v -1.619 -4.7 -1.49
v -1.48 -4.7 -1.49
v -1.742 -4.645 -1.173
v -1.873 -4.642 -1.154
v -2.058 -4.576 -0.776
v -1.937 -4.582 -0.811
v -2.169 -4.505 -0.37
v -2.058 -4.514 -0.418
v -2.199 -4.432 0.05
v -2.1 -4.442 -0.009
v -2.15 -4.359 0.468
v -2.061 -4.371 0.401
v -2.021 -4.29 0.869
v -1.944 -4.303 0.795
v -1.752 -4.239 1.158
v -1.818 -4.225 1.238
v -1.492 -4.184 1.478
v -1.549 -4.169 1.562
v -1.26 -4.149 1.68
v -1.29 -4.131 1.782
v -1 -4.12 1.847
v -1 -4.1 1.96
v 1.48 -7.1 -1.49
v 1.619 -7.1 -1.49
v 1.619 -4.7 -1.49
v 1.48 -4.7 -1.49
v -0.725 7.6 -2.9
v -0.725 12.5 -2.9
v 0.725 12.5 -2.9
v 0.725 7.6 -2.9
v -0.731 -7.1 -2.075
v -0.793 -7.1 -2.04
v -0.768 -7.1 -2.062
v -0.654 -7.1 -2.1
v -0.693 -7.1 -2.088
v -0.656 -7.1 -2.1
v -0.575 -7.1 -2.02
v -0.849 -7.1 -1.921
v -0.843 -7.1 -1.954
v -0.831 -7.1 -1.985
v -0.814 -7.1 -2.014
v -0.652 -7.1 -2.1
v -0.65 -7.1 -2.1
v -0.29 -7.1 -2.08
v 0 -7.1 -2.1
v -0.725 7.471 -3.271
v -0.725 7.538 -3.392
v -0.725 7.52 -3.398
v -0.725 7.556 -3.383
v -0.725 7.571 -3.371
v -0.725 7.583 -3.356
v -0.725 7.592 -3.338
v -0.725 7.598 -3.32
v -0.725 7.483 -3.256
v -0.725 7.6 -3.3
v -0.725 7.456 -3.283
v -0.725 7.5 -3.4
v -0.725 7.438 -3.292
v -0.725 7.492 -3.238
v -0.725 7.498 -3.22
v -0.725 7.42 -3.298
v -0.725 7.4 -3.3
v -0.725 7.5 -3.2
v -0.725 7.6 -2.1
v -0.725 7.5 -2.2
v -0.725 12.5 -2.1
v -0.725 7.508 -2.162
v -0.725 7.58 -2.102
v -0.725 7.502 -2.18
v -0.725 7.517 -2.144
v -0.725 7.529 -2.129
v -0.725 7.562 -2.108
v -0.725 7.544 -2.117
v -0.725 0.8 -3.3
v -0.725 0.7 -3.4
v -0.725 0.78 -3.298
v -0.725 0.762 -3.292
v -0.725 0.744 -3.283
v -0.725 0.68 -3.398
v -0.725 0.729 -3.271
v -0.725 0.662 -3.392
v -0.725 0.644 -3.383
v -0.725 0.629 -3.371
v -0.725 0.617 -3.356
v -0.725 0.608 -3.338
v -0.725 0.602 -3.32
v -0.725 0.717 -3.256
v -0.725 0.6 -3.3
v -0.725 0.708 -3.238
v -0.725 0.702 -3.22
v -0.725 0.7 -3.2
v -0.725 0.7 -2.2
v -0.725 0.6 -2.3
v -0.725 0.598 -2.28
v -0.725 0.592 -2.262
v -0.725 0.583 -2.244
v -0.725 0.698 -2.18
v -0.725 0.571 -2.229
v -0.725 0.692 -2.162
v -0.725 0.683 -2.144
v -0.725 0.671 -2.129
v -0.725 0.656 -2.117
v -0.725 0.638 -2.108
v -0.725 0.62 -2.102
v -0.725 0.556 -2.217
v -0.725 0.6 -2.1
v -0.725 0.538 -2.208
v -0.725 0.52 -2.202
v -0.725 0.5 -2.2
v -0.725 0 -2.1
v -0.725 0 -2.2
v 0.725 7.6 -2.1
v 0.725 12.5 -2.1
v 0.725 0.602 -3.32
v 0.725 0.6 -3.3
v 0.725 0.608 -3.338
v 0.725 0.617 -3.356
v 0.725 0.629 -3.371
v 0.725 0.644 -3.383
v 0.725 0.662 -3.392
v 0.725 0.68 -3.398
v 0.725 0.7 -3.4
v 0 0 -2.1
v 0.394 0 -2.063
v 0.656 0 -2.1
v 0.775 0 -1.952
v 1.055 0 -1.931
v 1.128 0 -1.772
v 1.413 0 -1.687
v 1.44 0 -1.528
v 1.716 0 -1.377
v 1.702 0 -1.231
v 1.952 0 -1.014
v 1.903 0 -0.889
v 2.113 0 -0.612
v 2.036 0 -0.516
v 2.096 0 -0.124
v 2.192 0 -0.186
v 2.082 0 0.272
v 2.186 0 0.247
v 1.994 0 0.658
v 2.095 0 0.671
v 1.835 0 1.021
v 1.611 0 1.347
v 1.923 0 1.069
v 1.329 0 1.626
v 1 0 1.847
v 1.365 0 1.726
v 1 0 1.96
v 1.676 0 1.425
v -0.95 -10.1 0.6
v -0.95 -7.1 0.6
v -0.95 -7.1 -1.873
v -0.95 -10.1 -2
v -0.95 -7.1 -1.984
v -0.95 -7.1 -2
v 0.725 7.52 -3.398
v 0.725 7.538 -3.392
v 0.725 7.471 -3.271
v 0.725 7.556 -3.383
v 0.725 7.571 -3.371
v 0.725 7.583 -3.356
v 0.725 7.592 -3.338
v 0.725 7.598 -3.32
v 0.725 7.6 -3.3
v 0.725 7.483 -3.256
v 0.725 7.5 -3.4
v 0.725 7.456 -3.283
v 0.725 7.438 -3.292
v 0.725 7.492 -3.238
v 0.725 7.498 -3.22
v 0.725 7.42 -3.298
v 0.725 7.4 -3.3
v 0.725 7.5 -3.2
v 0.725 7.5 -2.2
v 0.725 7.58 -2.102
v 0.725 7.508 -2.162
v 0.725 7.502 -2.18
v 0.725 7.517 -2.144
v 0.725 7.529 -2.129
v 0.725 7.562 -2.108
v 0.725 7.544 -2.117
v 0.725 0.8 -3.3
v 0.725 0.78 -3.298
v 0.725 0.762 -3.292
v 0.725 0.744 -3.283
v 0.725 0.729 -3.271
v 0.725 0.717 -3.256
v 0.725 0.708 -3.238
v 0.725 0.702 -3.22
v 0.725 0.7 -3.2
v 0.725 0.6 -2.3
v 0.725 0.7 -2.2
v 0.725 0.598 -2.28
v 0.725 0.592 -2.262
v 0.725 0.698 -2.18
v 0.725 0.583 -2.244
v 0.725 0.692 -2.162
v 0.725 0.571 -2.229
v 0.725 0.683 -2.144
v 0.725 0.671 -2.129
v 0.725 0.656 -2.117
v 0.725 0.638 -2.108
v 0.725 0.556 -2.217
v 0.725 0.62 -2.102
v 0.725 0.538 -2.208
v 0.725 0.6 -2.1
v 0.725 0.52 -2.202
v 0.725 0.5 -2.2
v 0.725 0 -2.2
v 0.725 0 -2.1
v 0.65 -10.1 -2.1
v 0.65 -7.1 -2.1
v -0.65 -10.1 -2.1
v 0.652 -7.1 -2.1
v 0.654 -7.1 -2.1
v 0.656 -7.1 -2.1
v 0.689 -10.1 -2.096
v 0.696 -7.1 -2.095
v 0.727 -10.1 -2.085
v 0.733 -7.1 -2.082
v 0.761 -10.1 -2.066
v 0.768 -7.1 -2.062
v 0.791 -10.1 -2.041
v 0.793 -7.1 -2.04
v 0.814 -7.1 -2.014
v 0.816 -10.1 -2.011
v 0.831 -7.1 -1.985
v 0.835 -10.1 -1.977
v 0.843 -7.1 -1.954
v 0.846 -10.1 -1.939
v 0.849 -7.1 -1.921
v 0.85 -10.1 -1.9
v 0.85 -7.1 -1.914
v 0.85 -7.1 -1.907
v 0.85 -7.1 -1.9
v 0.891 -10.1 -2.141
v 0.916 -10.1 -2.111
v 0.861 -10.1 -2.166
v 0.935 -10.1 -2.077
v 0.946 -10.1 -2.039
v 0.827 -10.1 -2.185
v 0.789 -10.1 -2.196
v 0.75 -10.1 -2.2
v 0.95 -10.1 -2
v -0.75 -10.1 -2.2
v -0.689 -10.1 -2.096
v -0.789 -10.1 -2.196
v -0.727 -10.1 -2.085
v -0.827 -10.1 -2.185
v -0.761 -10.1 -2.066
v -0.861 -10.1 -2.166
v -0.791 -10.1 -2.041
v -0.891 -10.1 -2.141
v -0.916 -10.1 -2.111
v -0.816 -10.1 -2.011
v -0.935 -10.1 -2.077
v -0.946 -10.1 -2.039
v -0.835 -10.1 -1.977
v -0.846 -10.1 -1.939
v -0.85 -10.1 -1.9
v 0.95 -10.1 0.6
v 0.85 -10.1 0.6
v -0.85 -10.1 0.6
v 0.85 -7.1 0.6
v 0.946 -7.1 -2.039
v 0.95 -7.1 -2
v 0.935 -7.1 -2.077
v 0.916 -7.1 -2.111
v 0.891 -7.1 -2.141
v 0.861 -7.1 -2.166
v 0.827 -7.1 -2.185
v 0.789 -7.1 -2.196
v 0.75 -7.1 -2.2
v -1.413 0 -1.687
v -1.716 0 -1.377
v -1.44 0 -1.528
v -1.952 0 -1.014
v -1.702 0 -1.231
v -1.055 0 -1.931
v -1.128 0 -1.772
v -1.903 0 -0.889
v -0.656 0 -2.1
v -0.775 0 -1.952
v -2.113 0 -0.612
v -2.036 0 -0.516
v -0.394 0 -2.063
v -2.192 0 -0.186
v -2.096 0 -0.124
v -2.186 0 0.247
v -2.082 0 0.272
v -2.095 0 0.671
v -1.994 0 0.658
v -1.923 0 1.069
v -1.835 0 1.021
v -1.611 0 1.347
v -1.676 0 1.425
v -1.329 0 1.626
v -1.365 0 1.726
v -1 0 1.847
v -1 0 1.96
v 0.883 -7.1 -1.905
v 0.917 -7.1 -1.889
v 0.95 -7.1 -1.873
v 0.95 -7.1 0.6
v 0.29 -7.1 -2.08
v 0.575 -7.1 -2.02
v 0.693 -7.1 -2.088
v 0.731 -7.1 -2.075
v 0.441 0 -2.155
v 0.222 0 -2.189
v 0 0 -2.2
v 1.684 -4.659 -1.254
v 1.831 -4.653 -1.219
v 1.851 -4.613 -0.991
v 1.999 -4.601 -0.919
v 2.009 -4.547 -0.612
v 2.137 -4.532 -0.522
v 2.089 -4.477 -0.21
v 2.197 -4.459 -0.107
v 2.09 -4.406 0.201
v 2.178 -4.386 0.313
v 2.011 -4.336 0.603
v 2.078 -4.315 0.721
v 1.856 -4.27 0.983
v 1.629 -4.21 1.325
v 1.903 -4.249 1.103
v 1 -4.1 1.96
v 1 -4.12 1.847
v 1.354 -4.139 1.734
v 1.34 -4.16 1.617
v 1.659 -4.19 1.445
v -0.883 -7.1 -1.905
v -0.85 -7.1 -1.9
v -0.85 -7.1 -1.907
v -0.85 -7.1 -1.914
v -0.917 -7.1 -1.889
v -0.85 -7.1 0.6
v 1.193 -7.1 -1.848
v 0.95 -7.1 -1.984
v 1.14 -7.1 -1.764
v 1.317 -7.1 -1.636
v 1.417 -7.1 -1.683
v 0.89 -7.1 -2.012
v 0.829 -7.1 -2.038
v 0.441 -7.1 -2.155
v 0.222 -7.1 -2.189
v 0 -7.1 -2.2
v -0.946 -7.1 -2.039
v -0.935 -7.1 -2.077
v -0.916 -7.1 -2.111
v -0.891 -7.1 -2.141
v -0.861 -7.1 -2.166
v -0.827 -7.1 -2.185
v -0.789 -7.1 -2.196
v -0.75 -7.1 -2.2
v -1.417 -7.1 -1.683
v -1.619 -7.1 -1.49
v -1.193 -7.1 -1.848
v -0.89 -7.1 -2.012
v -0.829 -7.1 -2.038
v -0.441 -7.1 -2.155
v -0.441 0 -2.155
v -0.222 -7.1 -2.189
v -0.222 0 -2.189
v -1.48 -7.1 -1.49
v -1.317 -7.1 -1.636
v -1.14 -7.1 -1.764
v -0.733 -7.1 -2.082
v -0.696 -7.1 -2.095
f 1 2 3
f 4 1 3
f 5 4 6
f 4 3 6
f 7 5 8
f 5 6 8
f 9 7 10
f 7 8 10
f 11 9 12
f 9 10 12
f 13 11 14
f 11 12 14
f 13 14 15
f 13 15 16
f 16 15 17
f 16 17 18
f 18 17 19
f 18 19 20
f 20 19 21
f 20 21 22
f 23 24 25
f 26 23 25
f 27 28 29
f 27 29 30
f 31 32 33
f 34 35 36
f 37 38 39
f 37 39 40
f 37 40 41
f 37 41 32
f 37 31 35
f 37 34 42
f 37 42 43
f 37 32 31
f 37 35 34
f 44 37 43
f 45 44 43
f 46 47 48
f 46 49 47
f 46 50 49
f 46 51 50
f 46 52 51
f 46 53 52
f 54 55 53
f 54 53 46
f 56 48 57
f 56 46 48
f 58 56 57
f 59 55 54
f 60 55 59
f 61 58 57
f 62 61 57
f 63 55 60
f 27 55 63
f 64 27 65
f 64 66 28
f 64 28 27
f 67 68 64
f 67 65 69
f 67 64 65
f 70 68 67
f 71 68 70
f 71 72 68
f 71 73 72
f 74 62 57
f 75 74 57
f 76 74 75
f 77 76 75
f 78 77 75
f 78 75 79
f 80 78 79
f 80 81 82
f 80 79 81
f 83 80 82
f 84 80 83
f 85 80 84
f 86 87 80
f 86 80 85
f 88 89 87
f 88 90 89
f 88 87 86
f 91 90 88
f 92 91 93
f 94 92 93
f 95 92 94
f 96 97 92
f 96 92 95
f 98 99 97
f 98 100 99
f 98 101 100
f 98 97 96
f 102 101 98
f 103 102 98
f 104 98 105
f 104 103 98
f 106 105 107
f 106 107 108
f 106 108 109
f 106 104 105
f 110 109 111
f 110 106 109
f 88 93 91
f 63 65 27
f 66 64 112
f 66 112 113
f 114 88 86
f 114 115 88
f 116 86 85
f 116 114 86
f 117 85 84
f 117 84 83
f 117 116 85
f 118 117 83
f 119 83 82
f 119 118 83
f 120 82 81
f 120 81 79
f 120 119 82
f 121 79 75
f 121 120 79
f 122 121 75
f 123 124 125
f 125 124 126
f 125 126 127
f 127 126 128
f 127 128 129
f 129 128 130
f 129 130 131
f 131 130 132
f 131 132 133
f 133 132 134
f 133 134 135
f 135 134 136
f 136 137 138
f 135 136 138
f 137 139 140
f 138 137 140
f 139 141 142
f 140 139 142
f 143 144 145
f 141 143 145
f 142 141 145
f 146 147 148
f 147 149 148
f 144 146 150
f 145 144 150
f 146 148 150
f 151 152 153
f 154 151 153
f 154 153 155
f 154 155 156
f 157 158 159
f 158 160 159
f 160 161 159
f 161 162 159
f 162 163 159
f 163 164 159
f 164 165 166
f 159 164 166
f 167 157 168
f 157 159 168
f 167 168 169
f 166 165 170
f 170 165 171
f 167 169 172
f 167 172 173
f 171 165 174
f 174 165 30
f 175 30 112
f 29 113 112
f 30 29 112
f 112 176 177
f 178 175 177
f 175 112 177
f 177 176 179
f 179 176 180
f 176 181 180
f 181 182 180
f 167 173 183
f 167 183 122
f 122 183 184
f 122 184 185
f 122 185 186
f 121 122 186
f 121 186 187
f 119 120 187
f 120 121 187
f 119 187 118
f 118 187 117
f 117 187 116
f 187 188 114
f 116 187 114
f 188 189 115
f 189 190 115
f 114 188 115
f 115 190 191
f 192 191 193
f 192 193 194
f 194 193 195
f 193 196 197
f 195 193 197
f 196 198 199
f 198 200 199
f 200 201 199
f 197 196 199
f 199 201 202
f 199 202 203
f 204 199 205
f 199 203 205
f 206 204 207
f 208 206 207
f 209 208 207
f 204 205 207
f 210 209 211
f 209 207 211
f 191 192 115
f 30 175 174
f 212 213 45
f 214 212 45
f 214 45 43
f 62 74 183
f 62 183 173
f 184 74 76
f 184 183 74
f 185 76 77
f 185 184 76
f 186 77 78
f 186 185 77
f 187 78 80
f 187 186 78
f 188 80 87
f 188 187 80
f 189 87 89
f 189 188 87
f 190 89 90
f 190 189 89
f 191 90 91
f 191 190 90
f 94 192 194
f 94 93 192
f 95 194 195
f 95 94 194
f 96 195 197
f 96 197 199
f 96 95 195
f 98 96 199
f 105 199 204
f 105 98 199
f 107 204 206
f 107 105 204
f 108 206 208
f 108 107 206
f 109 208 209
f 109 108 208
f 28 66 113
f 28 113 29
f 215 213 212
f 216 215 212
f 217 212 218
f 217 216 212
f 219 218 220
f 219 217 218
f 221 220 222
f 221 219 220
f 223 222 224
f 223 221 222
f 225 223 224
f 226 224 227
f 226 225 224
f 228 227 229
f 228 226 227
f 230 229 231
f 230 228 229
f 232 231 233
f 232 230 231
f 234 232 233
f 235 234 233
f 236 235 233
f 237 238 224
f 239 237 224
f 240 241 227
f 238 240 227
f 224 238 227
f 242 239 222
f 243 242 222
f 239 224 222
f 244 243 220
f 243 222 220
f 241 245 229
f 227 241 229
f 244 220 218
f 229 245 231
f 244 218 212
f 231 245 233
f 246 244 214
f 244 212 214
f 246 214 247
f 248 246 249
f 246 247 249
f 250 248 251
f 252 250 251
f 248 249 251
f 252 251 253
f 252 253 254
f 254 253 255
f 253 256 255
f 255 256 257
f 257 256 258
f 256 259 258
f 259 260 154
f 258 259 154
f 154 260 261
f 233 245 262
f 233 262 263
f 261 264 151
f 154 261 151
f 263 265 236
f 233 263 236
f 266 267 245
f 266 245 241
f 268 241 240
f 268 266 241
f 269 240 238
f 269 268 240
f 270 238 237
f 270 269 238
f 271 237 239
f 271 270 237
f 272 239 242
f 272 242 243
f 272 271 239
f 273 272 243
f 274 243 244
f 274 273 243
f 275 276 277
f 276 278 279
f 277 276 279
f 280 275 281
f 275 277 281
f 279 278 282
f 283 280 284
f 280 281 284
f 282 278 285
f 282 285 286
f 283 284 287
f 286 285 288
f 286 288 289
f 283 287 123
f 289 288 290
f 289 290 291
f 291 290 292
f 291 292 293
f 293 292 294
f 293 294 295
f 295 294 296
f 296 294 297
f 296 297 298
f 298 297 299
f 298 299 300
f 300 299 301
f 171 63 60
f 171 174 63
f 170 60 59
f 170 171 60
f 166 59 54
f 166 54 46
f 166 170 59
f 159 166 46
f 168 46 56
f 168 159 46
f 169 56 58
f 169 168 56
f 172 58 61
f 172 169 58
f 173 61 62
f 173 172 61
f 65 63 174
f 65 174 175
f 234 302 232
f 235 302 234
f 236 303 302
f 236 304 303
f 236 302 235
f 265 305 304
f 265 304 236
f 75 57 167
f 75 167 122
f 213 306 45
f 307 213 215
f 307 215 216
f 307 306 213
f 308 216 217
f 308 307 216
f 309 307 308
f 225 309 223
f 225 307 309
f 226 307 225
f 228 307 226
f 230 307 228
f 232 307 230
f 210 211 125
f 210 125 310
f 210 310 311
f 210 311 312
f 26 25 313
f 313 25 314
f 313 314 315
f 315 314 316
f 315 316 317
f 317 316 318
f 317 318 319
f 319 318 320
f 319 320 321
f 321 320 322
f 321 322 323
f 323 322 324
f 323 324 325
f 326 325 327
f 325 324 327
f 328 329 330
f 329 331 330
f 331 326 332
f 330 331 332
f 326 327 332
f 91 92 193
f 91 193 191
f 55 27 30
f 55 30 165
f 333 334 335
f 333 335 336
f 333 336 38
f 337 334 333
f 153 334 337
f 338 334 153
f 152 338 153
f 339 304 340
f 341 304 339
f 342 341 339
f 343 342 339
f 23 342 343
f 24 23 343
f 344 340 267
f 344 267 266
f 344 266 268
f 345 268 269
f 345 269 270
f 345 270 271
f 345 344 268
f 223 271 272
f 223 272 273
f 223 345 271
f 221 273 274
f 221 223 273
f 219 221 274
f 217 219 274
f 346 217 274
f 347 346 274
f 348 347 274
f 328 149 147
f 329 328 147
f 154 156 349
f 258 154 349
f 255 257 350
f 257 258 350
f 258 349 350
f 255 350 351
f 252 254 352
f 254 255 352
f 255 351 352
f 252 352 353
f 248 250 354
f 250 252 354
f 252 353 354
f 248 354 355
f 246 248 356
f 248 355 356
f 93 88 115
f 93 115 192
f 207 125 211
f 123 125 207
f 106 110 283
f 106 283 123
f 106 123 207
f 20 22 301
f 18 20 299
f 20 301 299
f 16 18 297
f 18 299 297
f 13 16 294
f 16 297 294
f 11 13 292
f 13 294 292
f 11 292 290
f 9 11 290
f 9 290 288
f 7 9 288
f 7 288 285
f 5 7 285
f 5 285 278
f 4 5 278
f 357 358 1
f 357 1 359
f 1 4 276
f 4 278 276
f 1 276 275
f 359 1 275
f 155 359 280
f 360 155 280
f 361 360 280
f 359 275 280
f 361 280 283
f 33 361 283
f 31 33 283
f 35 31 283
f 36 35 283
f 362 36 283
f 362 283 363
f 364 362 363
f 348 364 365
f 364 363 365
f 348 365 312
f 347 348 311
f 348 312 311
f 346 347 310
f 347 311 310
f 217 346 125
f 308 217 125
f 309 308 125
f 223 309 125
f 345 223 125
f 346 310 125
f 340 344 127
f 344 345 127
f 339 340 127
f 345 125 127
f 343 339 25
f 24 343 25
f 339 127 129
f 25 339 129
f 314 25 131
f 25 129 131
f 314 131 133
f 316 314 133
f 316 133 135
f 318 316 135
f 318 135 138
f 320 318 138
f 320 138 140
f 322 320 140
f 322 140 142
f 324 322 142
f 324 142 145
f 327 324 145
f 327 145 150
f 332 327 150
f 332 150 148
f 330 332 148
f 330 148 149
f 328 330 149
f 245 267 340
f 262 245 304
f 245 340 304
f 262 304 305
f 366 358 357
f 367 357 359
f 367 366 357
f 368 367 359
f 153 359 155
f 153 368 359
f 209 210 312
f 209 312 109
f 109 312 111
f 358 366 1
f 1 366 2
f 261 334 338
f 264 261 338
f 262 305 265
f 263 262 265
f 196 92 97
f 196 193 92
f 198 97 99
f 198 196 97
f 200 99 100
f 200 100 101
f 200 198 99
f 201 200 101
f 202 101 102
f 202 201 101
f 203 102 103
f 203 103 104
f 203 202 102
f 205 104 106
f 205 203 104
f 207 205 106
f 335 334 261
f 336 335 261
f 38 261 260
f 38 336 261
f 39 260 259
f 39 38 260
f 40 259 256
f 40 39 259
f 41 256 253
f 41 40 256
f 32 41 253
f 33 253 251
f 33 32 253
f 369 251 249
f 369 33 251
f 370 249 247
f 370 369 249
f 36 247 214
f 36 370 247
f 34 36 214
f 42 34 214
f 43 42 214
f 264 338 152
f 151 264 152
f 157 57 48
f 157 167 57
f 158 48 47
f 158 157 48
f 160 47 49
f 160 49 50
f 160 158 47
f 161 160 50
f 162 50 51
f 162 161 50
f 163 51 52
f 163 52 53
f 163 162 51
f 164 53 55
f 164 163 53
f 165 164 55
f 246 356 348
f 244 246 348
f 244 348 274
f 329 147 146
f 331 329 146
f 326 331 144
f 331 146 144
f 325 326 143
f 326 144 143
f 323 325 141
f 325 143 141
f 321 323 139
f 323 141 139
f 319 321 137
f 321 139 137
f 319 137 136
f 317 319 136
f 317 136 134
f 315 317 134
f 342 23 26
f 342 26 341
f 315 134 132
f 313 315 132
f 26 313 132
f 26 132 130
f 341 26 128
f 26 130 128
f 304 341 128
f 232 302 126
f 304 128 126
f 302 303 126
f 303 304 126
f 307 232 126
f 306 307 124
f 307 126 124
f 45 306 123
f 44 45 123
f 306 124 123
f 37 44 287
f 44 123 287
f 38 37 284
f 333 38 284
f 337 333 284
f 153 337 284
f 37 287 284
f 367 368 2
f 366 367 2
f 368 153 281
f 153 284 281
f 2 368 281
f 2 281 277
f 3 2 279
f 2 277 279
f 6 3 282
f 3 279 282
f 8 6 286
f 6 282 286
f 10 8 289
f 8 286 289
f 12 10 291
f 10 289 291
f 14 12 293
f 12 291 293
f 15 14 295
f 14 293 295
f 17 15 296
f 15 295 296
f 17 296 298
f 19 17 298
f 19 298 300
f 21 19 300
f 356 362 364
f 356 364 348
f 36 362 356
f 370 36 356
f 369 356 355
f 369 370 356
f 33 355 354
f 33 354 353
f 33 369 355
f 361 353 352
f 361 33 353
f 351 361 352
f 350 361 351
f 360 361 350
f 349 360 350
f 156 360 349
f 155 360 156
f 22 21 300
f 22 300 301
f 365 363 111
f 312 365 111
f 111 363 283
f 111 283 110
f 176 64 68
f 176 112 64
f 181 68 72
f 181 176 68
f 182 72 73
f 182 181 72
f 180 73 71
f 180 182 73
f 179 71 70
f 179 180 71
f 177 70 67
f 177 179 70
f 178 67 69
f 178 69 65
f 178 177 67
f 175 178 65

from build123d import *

# Parameters (mm, degrees)
F1_DEPTH     = 7.1
F2_W         = 1.45
F2_H         = 0.1
F3_DEPTH     = 0.6
F5_DEPTH     = 1.45
F6_R         = 0.1
F8_DEPTH     = 40
F10_DEPTH    = 3
F11_T1_DEPTH = 3
F11_T3_DEPTH = 4


# Not quite as in the source:
# - a fillet or chamfer that OpenCascade refuses, or shapes differently, is made with other operations: its cross-section is extruded or revolved along the edge and cut away or added


with BuildPart() as f1:
    # F0 (on Front) → F1 (new body)
    with BuildSketch(Plane.XZ):
        with BuildLine():
            Line((-1, 1.8466185313), (-1, 1.9595917942))
            ThreePointArc((-1, 1.9595917942), (0, -2.2), (1, 1.9595917942))
            Line((1, 1.9595917942), (1, 1.8466185313))
            ThreePointArc((1, 1.8466185313), (0, -2.1), (-1, 1.8466185313))
        make_face()
    extrude(amount=F1_DEPTH)

    # F2 (on face) → F3 (join)
    with BuildSketch(Plane(origin=(0, 0, 0), x_dir=(-1, 0, 0), z_dir=(0, 1, 0))):
        with Locations((0, -2.15)):
            Rectangle(F2_W, F2_H)
    extrude(amount=F3_DEPTH)

    # F4 (on face) → F5 (join, through all)
    with BuildSketch(Plane(origin=(-0.725, 0, 0), x_dir=(0, -1, 0), z_dir=(-1, 0, 0))):
        Polygon((-0.6, -3.4), (-0.6, -2.1), (-0.7, -2.1), (-0.7, -3.3), (-7.5, -3.3), (-7.5, -2.9), (-7.5, -2.1), (-12.5, -2.1), (-12.5, -2.9), (-7.6, -2.9), (-7.6, -3.4), align=None)
    extrude(amount=-F5_DEPTH)

    # F6
    f6_edges = [f1.edges().sort_by_distance(p)[0] for p in [
        (0, 0.7, -2.1),
        (0, 0.6, -2.2),
        (0, 0.6, -3.4),
        (0, 0.7, -3.3),
        (0, 7.5, -3.3),
        (0, 7.5, -2.1),
        (0, 7.6, -3.4),
    ]]
    fillet(f6_edges, radius=F6_R)

    # F7 (on Right) → F8 (cut, symmetric)
    with BuildSketch(Plane.YZ):
        Polygon((-4.7, -1.49), (-4.1, 1.9595917942), (-7.1, 1.9595917942), (-7.1, -1.49), align=None)
    extrude(amount=F8_DEPTH, both=True, mode=Mode.SUBTRACT)

    # F9 (on face) → F10 (join)
    with BuildSketch(Plane.XZ.offset(7.1)):
        Polygon((-0.95, 0.6), (-0.95, -2.2), (0.95, -2.2), (0.95, 0.6), (0.85, 0.6), (0.85, -2.1), (-0.85, -2.1), (-0.85, 0.6), align=None)
    extrude(amount=F10_DEPTH)

    # F11: fillet of radius 0.2 on 4 edges, made by hand

    # F11_s2 → F11_t1 (join)
    with BuildSketch(Plane.XZ.offset(7.1)):
        with BuildLine():
            ThreePointArc((-0.85, -1.9), (-0.7914213562, -2.0414213562), (-0.65, -2.1))
            Line((-0.65, -2.1), (-0.85, -2.1))
            Line((-0.85, -2.1), (-0.85, -1.9))
        make_face()
        with BuildLine():
            ThreePointArc((0.65, -2.1), (0.7914213562, -2.0414213562), (0.85, -1.9))
            Line((0.85, -1.9), (0.85, -2.1))
            Line((0.85, -2.1), (0.65, -2.1))
        make_face()
    extrude(amount=F11_T1_DEPTH)

    # F11_s4 → F11_t3 (cut)
    with BuildSketch(Plane.XZ.offset(6.6)):
        with BuildLine():
            ThreePointArc((-0.95, -2), (-0.8914213562, -2.1414213562), (-0.75, -2.2))
            Line((-0.75, -2.2), (-0.95, -2.2))
            Line((-0.95, -2.2), (-0.95, -2))
        make_face()
        with BuildLine():
            ThreePointArc((0.95, -2), (0.8914213562, -2.1414213562), (0.75, -2.2))
            Line((0.75, -2.2), (0.95, -2.2))
            Line((0.95, -2.2), (0.95, -2))
        make_face()
    extrude(amount=F11_T3_DEPTH, mode=Mode.SUBTRACT)


solid = f1.part
